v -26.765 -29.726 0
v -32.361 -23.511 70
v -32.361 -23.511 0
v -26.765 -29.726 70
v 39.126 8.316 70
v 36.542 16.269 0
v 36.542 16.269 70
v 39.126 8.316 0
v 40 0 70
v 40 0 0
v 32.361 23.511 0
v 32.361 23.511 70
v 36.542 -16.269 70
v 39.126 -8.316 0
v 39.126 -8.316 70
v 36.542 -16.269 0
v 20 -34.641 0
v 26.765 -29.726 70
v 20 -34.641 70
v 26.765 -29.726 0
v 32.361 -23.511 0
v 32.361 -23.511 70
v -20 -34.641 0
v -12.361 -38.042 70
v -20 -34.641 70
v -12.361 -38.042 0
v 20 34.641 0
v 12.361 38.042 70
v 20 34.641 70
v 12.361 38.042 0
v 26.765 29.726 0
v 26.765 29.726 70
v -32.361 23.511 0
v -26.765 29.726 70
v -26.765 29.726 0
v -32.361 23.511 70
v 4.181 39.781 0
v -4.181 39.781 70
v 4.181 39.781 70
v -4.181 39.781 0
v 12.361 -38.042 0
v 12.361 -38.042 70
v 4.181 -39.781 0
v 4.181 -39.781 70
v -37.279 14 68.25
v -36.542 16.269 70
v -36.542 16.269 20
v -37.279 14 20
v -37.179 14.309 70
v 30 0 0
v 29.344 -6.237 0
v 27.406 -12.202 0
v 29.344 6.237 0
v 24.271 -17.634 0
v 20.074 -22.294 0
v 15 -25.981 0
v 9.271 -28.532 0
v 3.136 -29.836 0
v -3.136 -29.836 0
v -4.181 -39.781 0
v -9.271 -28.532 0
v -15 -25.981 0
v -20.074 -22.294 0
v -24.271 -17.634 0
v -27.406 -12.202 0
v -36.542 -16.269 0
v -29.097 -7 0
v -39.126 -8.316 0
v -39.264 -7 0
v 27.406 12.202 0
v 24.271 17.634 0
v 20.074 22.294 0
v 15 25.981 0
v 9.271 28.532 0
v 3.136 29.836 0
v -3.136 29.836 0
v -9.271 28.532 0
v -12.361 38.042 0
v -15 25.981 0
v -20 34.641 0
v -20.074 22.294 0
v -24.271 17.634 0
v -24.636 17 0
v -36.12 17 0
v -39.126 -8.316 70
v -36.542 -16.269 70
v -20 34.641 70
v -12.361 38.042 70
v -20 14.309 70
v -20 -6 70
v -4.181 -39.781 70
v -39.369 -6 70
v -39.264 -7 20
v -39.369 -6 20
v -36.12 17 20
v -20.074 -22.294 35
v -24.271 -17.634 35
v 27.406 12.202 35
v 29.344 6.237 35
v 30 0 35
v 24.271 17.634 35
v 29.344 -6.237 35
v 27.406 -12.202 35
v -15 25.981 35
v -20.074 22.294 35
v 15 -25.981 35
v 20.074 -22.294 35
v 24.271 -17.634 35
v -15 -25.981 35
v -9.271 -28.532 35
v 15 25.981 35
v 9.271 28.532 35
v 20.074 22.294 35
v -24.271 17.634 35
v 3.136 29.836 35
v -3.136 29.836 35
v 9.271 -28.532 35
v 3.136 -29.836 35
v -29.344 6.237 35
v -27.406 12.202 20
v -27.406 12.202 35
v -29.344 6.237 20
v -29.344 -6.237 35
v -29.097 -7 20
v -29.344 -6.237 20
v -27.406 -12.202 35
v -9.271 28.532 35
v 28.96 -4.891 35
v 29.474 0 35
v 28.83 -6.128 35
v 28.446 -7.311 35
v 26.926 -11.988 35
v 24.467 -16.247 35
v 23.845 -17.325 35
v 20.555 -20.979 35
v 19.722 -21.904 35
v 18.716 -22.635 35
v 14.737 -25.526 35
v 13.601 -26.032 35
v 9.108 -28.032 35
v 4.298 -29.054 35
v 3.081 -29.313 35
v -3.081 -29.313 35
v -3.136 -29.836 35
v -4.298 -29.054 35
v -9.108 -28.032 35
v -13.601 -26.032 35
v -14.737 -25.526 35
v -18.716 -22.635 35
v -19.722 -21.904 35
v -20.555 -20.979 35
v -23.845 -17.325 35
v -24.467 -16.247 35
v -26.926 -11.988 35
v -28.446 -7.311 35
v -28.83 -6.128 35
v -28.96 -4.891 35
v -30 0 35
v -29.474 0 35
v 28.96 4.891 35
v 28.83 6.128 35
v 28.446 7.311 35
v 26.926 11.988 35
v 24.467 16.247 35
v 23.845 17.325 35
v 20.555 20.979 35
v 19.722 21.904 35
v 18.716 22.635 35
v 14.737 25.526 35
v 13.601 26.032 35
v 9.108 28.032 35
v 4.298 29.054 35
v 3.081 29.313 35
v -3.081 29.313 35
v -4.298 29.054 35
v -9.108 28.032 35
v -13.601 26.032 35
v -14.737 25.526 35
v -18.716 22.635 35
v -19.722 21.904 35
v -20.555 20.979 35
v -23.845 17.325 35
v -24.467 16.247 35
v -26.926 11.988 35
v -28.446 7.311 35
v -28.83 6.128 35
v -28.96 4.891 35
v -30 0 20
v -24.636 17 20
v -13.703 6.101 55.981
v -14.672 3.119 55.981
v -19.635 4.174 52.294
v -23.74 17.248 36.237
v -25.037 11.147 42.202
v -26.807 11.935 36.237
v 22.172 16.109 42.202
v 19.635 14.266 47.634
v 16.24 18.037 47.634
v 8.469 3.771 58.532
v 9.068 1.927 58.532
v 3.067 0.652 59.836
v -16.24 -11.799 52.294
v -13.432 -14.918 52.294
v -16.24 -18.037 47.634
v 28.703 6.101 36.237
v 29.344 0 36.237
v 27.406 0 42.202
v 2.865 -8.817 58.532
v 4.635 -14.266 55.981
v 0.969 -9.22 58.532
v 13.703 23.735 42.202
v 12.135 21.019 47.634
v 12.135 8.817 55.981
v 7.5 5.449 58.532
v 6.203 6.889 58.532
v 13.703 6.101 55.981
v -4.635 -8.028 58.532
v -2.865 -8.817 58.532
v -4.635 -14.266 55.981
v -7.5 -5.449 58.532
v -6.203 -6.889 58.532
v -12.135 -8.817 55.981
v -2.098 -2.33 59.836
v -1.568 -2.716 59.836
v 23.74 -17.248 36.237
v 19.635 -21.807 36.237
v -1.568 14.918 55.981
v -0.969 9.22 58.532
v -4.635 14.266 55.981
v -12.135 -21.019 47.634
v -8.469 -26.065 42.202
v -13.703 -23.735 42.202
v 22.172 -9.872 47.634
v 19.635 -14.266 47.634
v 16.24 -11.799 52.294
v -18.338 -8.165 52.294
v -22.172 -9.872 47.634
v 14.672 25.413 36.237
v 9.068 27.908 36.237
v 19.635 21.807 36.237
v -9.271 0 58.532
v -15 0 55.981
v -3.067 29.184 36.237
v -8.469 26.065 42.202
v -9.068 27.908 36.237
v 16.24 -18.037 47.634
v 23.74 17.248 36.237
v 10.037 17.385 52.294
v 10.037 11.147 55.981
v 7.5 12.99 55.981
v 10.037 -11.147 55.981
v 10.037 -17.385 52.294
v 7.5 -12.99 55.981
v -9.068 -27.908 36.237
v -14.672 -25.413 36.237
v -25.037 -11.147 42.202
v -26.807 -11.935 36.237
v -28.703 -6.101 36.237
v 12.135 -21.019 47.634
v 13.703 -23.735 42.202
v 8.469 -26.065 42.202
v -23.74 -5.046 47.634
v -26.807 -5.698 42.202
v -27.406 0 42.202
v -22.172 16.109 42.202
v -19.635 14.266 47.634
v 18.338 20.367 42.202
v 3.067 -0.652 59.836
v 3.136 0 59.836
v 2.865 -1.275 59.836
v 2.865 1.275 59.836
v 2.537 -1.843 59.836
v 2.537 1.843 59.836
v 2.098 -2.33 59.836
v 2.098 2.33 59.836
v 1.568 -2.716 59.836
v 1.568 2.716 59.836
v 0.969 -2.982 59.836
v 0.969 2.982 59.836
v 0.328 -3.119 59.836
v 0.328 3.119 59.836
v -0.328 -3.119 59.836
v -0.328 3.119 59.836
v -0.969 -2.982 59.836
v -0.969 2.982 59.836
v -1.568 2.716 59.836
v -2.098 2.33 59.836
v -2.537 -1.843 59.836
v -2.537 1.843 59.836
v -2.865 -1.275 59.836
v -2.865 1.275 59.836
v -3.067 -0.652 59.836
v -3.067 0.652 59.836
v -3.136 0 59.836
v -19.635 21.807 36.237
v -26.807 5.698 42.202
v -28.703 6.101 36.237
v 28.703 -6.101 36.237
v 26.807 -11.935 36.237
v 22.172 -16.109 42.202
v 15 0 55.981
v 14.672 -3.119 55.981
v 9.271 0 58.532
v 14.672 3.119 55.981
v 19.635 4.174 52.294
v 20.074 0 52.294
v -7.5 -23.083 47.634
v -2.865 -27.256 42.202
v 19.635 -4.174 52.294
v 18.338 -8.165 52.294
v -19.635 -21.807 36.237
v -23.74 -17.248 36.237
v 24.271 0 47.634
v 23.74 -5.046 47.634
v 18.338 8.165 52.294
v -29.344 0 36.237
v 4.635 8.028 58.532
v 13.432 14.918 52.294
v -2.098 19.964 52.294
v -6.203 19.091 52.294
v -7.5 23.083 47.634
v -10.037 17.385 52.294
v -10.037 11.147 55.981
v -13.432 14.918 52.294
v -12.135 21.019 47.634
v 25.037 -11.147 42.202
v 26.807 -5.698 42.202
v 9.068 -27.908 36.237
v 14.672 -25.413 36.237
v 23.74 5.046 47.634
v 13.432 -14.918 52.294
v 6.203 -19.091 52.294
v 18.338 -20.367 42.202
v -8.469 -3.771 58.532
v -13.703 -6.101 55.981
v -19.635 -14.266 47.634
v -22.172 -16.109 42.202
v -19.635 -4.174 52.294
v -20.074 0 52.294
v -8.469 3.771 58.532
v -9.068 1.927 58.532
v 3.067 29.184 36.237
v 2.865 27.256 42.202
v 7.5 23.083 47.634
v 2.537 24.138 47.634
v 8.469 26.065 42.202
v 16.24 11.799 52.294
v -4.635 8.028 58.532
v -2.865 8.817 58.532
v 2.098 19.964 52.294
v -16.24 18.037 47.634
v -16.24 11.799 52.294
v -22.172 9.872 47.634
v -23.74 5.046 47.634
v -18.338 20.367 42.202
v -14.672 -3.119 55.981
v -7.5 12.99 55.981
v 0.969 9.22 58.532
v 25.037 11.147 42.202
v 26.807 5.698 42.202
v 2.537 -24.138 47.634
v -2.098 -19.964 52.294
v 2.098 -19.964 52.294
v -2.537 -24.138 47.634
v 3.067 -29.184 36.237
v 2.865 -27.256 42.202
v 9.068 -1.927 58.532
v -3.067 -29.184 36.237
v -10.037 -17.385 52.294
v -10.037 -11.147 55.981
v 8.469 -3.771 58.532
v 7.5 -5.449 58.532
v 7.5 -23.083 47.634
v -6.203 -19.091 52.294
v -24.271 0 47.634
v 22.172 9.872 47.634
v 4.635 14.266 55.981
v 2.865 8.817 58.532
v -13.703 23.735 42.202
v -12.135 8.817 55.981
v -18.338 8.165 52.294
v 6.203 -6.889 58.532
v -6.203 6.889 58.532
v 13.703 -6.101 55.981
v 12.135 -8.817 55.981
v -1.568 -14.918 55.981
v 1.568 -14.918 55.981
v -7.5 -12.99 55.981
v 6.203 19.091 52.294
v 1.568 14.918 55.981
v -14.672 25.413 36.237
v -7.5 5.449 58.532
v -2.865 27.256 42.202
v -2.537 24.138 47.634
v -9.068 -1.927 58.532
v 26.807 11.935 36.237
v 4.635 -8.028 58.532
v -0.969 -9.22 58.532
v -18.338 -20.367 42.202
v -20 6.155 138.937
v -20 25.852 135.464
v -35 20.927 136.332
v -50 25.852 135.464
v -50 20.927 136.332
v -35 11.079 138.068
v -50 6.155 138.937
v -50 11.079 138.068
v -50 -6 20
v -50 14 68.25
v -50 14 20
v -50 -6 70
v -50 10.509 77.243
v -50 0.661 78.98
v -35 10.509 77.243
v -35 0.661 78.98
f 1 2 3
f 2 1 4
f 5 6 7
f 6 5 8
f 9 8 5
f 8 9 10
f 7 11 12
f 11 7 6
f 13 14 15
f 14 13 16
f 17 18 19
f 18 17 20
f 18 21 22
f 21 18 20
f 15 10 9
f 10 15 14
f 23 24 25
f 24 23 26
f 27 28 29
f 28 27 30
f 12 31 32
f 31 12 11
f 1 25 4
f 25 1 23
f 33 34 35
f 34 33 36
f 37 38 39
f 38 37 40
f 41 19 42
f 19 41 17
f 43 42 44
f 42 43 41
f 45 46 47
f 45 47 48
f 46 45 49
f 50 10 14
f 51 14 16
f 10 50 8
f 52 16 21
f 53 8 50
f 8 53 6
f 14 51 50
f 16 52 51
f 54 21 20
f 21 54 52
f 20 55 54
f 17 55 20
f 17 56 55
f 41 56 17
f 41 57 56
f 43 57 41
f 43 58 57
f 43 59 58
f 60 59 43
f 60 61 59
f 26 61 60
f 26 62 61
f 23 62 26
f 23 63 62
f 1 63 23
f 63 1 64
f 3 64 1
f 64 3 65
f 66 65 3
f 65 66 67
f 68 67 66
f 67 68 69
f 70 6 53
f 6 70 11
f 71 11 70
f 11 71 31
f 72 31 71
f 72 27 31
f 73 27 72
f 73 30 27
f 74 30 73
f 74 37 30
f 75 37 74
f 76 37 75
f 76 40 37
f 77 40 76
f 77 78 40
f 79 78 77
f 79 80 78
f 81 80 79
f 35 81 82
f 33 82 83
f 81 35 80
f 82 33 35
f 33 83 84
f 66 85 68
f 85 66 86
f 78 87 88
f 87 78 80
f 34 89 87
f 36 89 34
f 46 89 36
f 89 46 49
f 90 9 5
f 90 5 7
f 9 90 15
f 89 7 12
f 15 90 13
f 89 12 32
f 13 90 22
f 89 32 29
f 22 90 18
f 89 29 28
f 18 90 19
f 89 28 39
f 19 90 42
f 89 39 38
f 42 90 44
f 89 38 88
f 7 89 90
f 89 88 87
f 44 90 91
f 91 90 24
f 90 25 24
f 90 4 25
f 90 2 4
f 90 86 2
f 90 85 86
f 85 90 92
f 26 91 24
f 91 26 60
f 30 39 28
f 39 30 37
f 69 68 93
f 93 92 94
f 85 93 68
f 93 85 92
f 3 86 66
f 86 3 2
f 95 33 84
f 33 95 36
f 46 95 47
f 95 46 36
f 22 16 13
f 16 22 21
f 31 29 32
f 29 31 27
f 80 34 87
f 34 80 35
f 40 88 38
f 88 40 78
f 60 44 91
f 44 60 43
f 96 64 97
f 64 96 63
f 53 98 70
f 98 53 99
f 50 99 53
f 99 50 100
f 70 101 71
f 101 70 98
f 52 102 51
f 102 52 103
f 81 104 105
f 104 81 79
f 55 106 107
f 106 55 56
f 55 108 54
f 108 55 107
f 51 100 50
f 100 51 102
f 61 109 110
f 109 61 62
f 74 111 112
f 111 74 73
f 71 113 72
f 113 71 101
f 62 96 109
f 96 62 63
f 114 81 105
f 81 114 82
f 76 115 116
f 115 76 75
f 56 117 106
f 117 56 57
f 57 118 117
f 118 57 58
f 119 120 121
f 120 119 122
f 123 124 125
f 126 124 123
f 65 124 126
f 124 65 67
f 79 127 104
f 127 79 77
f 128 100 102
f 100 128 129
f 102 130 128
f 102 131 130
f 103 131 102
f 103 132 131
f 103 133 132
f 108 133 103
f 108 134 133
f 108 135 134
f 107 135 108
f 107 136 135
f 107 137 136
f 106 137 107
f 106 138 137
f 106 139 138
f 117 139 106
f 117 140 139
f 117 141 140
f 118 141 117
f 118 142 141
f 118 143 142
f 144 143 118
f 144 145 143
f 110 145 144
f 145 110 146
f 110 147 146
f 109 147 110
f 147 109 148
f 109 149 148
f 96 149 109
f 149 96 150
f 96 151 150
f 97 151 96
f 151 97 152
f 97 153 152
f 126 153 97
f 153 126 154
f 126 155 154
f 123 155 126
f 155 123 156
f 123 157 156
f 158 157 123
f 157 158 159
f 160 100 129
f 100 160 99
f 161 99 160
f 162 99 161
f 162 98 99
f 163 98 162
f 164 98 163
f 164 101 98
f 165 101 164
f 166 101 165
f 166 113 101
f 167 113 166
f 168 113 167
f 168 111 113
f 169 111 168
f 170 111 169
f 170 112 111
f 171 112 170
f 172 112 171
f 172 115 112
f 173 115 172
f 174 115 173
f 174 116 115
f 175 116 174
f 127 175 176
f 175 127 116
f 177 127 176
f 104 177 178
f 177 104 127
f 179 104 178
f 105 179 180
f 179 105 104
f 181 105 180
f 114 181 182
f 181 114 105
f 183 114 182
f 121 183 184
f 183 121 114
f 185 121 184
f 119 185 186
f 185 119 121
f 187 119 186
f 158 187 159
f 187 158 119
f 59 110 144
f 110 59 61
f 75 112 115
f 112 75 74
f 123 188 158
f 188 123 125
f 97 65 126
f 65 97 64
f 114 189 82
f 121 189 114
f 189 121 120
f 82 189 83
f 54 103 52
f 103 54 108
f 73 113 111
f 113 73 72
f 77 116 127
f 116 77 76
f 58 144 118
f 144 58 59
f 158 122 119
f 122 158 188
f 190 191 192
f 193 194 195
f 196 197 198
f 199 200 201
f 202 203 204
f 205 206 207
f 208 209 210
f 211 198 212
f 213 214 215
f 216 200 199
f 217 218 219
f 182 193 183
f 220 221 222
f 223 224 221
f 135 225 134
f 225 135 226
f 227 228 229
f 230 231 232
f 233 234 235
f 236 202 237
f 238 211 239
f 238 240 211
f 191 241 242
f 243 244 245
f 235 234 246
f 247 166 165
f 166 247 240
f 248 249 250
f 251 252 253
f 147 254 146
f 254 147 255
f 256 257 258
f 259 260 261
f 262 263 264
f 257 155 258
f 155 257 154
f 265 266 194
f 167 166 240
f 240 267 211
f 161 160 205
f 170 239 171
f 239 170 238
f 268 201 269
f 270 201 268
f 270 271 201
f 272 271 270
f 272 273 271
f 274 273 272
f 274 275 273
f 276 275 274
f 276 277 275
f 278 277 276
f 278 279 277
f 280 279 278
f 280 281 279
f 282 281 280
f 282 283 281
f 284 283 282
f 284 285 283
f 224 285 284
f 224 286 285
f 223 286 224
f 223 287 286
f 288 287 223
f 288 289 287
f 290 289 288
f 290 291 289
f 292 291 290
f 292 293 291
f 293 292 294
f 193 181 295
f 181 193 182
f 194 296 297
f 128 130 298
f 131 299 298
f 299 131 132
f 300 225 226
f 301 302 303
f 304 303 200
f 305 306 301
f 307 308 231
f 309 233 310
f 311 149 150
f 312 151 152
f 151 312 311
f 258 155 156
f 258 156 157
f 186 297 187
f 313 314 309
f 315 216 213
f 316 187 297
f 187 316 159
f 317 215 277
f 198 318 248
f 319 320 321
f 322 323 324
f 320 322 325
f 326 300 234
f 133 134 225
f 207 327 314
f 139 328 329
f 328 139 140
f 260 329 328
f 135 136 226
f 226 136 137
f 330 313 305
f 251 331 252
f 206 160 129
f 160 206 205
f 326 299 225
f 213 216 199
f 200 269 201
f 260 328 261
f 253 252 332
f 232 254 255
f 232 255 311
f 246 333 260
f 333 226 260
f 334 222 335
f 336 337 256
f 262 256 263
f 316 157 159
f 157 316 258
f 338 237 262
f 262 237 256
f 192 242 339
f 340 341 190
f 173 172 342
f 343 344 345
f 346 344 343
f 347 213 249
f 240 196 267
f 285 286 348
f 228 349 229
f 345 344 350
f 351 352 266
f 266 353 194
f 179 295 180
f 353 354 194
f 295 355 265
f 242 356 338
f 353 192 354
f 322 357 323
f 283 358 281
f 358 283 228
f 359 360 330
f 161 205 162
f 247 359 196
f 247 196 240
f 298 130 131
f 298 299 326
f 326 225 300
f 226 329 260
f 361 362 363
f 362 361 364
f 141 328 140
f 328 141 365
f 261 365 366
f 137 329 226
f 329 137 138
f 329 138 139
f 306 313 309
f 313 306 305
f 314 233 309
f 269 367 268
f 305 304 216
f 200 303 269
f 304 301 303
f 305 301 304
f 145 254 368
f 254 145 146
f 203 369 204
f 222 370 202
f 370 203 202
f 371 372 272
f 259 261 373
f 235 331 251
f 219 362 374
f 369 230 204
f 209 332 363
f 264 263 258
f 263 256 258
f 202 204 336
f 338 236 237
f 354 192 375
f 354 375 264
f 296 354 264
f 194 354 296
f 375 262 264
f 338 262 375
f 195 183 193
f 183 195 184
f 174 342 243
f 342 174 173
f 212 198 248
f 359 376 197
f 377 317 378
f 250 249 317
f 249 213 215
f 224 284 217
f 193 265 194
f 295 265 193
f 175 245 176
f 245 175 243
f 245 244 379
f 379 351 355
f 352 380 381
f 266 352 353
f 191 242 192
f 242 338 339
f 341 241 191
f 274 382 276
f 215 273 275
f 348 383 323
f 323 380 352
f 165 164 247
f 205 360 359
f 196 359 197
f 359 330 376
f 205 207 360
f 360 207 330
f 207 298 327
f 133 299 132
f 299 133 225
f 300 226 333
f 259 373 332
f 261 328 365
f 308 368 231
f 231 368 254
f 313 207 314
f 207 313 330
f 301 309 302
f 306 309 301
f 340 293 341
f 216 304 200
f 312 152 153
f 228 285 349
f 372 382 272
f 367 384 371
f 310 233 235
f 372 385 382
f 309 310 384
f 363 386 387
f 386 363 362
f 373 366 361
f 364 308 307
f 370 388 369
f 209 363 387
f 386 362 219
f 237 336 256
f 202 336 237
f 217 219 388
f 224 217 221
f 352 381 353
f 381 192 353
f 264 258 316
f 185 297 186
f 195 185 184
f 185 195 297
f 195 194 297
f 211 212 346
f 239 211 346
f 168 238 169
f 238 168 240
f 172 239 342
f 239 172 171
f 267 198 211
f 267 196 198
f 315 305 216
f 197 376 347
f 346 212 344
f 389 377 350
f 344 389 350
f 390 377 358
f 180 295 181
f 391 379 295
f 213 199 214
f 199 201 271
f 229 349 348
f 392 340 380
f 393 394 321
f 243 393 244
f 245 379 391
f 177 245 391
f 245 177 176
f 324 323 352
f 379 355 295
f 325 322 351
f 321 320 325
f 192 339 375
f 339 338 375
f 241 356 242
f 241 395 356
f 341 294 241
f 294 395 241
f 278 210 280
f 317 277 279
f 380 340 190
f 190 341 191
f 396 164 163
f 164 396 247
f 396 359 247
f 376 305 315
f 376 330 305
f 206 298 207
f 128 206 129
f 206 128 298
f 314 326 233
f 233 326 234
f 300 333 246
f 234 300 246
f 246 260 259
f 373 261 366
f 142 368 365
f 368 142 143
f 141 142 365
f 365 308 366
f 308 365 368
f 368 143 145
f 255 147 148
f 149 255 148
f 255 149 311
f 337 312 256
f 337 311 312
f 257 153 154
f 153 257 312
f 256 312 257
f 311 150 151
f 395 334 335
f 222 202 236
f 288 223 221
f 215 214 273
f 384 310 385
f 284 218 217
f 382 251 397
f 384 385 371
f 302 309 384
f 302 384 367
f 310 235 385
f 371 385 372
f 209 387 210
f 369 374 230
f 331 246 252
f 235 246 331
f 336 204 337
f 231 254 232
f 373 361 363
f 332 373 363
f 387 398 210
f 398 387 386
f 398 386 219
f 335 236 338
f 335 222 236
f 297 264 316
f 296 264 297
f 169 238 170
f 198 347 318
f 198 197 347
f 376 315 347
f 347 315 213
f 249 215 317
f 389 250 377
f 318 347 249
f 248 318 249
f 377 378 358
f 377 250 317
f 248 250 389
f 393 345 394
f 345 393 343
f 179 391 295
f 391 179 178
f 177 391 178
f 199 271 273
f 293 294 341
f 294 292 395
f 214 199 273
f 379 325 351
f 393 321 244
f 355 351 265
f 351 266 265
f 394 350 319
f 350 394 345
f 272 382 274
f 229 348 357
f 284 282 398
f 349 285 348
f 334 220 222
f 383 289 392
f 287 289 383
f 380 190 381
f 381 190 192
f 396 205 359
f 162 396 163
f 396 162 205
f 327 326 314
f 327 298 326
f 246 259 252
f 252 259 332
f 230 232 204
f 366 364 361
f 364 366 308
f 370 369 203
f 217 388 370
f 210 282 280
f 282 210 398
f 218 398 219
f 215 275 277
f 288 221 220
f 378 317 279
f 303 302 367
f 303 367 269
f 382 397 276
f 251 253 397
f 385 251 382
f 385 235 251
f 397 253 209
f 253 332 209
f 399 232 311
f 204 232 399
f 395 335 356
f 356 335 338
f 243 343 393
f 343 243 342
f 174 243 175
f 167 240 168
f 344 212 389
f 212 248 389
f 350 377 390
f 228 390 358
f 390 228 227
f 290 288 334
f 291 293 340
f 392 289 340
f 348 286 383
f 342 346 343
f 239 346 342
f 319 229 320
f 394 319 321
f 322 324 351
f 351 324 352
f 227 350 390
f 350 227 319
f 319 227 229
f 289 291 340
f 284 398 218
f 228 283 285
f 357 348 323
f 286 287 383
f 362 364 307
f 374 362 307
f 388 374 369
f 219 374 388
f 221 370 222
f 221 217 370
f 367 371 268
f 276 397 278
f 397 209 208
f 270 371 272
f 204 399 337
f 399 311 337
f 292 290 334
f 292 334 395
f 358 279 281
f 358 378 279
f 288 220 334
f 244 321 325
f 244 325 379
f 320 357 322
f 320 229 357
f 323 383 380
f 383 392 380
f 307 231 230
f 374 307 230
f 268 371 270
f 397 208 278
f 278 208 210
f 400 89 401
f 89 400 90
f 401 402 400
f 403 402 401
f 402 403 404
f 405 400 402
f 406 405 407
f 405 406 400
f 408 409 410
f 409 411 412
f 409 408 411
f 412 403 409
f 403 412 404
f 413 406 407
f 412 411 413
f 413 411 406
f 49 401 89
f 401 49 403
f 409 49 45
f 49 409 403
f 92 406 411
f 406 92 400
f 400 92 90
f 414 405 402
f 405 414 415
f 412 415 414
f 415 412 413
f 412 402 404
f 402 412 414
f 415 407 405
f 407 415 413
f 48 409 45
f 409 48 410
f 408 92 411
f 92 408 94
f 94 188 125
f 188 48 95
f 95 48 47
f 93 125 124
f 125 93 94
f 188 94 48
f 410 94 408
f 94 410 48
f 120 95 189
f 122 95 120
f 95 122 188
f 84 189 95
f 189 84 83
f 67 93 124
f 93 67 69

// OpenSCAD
difference() {
    group() {
        difference() {
            cylinder(70, 40, 40);    
            cylinder(35, 30, 30);
            translate([0, 0, 30])
                sphere(30);
        }

        translate([-50, -6, 0])
        cube([20, 20, 70]);

        translate([-50, -6, 70])
        rotate([-10, 0, 0])
        
        difference() {
            cube([30, 20, 70]);
            translate([0, 5, 10])
            cube([15, 10, 70]);
        }
    }
    translate([-100, -7, 0])
    cube([100, 24, 20]);
}
